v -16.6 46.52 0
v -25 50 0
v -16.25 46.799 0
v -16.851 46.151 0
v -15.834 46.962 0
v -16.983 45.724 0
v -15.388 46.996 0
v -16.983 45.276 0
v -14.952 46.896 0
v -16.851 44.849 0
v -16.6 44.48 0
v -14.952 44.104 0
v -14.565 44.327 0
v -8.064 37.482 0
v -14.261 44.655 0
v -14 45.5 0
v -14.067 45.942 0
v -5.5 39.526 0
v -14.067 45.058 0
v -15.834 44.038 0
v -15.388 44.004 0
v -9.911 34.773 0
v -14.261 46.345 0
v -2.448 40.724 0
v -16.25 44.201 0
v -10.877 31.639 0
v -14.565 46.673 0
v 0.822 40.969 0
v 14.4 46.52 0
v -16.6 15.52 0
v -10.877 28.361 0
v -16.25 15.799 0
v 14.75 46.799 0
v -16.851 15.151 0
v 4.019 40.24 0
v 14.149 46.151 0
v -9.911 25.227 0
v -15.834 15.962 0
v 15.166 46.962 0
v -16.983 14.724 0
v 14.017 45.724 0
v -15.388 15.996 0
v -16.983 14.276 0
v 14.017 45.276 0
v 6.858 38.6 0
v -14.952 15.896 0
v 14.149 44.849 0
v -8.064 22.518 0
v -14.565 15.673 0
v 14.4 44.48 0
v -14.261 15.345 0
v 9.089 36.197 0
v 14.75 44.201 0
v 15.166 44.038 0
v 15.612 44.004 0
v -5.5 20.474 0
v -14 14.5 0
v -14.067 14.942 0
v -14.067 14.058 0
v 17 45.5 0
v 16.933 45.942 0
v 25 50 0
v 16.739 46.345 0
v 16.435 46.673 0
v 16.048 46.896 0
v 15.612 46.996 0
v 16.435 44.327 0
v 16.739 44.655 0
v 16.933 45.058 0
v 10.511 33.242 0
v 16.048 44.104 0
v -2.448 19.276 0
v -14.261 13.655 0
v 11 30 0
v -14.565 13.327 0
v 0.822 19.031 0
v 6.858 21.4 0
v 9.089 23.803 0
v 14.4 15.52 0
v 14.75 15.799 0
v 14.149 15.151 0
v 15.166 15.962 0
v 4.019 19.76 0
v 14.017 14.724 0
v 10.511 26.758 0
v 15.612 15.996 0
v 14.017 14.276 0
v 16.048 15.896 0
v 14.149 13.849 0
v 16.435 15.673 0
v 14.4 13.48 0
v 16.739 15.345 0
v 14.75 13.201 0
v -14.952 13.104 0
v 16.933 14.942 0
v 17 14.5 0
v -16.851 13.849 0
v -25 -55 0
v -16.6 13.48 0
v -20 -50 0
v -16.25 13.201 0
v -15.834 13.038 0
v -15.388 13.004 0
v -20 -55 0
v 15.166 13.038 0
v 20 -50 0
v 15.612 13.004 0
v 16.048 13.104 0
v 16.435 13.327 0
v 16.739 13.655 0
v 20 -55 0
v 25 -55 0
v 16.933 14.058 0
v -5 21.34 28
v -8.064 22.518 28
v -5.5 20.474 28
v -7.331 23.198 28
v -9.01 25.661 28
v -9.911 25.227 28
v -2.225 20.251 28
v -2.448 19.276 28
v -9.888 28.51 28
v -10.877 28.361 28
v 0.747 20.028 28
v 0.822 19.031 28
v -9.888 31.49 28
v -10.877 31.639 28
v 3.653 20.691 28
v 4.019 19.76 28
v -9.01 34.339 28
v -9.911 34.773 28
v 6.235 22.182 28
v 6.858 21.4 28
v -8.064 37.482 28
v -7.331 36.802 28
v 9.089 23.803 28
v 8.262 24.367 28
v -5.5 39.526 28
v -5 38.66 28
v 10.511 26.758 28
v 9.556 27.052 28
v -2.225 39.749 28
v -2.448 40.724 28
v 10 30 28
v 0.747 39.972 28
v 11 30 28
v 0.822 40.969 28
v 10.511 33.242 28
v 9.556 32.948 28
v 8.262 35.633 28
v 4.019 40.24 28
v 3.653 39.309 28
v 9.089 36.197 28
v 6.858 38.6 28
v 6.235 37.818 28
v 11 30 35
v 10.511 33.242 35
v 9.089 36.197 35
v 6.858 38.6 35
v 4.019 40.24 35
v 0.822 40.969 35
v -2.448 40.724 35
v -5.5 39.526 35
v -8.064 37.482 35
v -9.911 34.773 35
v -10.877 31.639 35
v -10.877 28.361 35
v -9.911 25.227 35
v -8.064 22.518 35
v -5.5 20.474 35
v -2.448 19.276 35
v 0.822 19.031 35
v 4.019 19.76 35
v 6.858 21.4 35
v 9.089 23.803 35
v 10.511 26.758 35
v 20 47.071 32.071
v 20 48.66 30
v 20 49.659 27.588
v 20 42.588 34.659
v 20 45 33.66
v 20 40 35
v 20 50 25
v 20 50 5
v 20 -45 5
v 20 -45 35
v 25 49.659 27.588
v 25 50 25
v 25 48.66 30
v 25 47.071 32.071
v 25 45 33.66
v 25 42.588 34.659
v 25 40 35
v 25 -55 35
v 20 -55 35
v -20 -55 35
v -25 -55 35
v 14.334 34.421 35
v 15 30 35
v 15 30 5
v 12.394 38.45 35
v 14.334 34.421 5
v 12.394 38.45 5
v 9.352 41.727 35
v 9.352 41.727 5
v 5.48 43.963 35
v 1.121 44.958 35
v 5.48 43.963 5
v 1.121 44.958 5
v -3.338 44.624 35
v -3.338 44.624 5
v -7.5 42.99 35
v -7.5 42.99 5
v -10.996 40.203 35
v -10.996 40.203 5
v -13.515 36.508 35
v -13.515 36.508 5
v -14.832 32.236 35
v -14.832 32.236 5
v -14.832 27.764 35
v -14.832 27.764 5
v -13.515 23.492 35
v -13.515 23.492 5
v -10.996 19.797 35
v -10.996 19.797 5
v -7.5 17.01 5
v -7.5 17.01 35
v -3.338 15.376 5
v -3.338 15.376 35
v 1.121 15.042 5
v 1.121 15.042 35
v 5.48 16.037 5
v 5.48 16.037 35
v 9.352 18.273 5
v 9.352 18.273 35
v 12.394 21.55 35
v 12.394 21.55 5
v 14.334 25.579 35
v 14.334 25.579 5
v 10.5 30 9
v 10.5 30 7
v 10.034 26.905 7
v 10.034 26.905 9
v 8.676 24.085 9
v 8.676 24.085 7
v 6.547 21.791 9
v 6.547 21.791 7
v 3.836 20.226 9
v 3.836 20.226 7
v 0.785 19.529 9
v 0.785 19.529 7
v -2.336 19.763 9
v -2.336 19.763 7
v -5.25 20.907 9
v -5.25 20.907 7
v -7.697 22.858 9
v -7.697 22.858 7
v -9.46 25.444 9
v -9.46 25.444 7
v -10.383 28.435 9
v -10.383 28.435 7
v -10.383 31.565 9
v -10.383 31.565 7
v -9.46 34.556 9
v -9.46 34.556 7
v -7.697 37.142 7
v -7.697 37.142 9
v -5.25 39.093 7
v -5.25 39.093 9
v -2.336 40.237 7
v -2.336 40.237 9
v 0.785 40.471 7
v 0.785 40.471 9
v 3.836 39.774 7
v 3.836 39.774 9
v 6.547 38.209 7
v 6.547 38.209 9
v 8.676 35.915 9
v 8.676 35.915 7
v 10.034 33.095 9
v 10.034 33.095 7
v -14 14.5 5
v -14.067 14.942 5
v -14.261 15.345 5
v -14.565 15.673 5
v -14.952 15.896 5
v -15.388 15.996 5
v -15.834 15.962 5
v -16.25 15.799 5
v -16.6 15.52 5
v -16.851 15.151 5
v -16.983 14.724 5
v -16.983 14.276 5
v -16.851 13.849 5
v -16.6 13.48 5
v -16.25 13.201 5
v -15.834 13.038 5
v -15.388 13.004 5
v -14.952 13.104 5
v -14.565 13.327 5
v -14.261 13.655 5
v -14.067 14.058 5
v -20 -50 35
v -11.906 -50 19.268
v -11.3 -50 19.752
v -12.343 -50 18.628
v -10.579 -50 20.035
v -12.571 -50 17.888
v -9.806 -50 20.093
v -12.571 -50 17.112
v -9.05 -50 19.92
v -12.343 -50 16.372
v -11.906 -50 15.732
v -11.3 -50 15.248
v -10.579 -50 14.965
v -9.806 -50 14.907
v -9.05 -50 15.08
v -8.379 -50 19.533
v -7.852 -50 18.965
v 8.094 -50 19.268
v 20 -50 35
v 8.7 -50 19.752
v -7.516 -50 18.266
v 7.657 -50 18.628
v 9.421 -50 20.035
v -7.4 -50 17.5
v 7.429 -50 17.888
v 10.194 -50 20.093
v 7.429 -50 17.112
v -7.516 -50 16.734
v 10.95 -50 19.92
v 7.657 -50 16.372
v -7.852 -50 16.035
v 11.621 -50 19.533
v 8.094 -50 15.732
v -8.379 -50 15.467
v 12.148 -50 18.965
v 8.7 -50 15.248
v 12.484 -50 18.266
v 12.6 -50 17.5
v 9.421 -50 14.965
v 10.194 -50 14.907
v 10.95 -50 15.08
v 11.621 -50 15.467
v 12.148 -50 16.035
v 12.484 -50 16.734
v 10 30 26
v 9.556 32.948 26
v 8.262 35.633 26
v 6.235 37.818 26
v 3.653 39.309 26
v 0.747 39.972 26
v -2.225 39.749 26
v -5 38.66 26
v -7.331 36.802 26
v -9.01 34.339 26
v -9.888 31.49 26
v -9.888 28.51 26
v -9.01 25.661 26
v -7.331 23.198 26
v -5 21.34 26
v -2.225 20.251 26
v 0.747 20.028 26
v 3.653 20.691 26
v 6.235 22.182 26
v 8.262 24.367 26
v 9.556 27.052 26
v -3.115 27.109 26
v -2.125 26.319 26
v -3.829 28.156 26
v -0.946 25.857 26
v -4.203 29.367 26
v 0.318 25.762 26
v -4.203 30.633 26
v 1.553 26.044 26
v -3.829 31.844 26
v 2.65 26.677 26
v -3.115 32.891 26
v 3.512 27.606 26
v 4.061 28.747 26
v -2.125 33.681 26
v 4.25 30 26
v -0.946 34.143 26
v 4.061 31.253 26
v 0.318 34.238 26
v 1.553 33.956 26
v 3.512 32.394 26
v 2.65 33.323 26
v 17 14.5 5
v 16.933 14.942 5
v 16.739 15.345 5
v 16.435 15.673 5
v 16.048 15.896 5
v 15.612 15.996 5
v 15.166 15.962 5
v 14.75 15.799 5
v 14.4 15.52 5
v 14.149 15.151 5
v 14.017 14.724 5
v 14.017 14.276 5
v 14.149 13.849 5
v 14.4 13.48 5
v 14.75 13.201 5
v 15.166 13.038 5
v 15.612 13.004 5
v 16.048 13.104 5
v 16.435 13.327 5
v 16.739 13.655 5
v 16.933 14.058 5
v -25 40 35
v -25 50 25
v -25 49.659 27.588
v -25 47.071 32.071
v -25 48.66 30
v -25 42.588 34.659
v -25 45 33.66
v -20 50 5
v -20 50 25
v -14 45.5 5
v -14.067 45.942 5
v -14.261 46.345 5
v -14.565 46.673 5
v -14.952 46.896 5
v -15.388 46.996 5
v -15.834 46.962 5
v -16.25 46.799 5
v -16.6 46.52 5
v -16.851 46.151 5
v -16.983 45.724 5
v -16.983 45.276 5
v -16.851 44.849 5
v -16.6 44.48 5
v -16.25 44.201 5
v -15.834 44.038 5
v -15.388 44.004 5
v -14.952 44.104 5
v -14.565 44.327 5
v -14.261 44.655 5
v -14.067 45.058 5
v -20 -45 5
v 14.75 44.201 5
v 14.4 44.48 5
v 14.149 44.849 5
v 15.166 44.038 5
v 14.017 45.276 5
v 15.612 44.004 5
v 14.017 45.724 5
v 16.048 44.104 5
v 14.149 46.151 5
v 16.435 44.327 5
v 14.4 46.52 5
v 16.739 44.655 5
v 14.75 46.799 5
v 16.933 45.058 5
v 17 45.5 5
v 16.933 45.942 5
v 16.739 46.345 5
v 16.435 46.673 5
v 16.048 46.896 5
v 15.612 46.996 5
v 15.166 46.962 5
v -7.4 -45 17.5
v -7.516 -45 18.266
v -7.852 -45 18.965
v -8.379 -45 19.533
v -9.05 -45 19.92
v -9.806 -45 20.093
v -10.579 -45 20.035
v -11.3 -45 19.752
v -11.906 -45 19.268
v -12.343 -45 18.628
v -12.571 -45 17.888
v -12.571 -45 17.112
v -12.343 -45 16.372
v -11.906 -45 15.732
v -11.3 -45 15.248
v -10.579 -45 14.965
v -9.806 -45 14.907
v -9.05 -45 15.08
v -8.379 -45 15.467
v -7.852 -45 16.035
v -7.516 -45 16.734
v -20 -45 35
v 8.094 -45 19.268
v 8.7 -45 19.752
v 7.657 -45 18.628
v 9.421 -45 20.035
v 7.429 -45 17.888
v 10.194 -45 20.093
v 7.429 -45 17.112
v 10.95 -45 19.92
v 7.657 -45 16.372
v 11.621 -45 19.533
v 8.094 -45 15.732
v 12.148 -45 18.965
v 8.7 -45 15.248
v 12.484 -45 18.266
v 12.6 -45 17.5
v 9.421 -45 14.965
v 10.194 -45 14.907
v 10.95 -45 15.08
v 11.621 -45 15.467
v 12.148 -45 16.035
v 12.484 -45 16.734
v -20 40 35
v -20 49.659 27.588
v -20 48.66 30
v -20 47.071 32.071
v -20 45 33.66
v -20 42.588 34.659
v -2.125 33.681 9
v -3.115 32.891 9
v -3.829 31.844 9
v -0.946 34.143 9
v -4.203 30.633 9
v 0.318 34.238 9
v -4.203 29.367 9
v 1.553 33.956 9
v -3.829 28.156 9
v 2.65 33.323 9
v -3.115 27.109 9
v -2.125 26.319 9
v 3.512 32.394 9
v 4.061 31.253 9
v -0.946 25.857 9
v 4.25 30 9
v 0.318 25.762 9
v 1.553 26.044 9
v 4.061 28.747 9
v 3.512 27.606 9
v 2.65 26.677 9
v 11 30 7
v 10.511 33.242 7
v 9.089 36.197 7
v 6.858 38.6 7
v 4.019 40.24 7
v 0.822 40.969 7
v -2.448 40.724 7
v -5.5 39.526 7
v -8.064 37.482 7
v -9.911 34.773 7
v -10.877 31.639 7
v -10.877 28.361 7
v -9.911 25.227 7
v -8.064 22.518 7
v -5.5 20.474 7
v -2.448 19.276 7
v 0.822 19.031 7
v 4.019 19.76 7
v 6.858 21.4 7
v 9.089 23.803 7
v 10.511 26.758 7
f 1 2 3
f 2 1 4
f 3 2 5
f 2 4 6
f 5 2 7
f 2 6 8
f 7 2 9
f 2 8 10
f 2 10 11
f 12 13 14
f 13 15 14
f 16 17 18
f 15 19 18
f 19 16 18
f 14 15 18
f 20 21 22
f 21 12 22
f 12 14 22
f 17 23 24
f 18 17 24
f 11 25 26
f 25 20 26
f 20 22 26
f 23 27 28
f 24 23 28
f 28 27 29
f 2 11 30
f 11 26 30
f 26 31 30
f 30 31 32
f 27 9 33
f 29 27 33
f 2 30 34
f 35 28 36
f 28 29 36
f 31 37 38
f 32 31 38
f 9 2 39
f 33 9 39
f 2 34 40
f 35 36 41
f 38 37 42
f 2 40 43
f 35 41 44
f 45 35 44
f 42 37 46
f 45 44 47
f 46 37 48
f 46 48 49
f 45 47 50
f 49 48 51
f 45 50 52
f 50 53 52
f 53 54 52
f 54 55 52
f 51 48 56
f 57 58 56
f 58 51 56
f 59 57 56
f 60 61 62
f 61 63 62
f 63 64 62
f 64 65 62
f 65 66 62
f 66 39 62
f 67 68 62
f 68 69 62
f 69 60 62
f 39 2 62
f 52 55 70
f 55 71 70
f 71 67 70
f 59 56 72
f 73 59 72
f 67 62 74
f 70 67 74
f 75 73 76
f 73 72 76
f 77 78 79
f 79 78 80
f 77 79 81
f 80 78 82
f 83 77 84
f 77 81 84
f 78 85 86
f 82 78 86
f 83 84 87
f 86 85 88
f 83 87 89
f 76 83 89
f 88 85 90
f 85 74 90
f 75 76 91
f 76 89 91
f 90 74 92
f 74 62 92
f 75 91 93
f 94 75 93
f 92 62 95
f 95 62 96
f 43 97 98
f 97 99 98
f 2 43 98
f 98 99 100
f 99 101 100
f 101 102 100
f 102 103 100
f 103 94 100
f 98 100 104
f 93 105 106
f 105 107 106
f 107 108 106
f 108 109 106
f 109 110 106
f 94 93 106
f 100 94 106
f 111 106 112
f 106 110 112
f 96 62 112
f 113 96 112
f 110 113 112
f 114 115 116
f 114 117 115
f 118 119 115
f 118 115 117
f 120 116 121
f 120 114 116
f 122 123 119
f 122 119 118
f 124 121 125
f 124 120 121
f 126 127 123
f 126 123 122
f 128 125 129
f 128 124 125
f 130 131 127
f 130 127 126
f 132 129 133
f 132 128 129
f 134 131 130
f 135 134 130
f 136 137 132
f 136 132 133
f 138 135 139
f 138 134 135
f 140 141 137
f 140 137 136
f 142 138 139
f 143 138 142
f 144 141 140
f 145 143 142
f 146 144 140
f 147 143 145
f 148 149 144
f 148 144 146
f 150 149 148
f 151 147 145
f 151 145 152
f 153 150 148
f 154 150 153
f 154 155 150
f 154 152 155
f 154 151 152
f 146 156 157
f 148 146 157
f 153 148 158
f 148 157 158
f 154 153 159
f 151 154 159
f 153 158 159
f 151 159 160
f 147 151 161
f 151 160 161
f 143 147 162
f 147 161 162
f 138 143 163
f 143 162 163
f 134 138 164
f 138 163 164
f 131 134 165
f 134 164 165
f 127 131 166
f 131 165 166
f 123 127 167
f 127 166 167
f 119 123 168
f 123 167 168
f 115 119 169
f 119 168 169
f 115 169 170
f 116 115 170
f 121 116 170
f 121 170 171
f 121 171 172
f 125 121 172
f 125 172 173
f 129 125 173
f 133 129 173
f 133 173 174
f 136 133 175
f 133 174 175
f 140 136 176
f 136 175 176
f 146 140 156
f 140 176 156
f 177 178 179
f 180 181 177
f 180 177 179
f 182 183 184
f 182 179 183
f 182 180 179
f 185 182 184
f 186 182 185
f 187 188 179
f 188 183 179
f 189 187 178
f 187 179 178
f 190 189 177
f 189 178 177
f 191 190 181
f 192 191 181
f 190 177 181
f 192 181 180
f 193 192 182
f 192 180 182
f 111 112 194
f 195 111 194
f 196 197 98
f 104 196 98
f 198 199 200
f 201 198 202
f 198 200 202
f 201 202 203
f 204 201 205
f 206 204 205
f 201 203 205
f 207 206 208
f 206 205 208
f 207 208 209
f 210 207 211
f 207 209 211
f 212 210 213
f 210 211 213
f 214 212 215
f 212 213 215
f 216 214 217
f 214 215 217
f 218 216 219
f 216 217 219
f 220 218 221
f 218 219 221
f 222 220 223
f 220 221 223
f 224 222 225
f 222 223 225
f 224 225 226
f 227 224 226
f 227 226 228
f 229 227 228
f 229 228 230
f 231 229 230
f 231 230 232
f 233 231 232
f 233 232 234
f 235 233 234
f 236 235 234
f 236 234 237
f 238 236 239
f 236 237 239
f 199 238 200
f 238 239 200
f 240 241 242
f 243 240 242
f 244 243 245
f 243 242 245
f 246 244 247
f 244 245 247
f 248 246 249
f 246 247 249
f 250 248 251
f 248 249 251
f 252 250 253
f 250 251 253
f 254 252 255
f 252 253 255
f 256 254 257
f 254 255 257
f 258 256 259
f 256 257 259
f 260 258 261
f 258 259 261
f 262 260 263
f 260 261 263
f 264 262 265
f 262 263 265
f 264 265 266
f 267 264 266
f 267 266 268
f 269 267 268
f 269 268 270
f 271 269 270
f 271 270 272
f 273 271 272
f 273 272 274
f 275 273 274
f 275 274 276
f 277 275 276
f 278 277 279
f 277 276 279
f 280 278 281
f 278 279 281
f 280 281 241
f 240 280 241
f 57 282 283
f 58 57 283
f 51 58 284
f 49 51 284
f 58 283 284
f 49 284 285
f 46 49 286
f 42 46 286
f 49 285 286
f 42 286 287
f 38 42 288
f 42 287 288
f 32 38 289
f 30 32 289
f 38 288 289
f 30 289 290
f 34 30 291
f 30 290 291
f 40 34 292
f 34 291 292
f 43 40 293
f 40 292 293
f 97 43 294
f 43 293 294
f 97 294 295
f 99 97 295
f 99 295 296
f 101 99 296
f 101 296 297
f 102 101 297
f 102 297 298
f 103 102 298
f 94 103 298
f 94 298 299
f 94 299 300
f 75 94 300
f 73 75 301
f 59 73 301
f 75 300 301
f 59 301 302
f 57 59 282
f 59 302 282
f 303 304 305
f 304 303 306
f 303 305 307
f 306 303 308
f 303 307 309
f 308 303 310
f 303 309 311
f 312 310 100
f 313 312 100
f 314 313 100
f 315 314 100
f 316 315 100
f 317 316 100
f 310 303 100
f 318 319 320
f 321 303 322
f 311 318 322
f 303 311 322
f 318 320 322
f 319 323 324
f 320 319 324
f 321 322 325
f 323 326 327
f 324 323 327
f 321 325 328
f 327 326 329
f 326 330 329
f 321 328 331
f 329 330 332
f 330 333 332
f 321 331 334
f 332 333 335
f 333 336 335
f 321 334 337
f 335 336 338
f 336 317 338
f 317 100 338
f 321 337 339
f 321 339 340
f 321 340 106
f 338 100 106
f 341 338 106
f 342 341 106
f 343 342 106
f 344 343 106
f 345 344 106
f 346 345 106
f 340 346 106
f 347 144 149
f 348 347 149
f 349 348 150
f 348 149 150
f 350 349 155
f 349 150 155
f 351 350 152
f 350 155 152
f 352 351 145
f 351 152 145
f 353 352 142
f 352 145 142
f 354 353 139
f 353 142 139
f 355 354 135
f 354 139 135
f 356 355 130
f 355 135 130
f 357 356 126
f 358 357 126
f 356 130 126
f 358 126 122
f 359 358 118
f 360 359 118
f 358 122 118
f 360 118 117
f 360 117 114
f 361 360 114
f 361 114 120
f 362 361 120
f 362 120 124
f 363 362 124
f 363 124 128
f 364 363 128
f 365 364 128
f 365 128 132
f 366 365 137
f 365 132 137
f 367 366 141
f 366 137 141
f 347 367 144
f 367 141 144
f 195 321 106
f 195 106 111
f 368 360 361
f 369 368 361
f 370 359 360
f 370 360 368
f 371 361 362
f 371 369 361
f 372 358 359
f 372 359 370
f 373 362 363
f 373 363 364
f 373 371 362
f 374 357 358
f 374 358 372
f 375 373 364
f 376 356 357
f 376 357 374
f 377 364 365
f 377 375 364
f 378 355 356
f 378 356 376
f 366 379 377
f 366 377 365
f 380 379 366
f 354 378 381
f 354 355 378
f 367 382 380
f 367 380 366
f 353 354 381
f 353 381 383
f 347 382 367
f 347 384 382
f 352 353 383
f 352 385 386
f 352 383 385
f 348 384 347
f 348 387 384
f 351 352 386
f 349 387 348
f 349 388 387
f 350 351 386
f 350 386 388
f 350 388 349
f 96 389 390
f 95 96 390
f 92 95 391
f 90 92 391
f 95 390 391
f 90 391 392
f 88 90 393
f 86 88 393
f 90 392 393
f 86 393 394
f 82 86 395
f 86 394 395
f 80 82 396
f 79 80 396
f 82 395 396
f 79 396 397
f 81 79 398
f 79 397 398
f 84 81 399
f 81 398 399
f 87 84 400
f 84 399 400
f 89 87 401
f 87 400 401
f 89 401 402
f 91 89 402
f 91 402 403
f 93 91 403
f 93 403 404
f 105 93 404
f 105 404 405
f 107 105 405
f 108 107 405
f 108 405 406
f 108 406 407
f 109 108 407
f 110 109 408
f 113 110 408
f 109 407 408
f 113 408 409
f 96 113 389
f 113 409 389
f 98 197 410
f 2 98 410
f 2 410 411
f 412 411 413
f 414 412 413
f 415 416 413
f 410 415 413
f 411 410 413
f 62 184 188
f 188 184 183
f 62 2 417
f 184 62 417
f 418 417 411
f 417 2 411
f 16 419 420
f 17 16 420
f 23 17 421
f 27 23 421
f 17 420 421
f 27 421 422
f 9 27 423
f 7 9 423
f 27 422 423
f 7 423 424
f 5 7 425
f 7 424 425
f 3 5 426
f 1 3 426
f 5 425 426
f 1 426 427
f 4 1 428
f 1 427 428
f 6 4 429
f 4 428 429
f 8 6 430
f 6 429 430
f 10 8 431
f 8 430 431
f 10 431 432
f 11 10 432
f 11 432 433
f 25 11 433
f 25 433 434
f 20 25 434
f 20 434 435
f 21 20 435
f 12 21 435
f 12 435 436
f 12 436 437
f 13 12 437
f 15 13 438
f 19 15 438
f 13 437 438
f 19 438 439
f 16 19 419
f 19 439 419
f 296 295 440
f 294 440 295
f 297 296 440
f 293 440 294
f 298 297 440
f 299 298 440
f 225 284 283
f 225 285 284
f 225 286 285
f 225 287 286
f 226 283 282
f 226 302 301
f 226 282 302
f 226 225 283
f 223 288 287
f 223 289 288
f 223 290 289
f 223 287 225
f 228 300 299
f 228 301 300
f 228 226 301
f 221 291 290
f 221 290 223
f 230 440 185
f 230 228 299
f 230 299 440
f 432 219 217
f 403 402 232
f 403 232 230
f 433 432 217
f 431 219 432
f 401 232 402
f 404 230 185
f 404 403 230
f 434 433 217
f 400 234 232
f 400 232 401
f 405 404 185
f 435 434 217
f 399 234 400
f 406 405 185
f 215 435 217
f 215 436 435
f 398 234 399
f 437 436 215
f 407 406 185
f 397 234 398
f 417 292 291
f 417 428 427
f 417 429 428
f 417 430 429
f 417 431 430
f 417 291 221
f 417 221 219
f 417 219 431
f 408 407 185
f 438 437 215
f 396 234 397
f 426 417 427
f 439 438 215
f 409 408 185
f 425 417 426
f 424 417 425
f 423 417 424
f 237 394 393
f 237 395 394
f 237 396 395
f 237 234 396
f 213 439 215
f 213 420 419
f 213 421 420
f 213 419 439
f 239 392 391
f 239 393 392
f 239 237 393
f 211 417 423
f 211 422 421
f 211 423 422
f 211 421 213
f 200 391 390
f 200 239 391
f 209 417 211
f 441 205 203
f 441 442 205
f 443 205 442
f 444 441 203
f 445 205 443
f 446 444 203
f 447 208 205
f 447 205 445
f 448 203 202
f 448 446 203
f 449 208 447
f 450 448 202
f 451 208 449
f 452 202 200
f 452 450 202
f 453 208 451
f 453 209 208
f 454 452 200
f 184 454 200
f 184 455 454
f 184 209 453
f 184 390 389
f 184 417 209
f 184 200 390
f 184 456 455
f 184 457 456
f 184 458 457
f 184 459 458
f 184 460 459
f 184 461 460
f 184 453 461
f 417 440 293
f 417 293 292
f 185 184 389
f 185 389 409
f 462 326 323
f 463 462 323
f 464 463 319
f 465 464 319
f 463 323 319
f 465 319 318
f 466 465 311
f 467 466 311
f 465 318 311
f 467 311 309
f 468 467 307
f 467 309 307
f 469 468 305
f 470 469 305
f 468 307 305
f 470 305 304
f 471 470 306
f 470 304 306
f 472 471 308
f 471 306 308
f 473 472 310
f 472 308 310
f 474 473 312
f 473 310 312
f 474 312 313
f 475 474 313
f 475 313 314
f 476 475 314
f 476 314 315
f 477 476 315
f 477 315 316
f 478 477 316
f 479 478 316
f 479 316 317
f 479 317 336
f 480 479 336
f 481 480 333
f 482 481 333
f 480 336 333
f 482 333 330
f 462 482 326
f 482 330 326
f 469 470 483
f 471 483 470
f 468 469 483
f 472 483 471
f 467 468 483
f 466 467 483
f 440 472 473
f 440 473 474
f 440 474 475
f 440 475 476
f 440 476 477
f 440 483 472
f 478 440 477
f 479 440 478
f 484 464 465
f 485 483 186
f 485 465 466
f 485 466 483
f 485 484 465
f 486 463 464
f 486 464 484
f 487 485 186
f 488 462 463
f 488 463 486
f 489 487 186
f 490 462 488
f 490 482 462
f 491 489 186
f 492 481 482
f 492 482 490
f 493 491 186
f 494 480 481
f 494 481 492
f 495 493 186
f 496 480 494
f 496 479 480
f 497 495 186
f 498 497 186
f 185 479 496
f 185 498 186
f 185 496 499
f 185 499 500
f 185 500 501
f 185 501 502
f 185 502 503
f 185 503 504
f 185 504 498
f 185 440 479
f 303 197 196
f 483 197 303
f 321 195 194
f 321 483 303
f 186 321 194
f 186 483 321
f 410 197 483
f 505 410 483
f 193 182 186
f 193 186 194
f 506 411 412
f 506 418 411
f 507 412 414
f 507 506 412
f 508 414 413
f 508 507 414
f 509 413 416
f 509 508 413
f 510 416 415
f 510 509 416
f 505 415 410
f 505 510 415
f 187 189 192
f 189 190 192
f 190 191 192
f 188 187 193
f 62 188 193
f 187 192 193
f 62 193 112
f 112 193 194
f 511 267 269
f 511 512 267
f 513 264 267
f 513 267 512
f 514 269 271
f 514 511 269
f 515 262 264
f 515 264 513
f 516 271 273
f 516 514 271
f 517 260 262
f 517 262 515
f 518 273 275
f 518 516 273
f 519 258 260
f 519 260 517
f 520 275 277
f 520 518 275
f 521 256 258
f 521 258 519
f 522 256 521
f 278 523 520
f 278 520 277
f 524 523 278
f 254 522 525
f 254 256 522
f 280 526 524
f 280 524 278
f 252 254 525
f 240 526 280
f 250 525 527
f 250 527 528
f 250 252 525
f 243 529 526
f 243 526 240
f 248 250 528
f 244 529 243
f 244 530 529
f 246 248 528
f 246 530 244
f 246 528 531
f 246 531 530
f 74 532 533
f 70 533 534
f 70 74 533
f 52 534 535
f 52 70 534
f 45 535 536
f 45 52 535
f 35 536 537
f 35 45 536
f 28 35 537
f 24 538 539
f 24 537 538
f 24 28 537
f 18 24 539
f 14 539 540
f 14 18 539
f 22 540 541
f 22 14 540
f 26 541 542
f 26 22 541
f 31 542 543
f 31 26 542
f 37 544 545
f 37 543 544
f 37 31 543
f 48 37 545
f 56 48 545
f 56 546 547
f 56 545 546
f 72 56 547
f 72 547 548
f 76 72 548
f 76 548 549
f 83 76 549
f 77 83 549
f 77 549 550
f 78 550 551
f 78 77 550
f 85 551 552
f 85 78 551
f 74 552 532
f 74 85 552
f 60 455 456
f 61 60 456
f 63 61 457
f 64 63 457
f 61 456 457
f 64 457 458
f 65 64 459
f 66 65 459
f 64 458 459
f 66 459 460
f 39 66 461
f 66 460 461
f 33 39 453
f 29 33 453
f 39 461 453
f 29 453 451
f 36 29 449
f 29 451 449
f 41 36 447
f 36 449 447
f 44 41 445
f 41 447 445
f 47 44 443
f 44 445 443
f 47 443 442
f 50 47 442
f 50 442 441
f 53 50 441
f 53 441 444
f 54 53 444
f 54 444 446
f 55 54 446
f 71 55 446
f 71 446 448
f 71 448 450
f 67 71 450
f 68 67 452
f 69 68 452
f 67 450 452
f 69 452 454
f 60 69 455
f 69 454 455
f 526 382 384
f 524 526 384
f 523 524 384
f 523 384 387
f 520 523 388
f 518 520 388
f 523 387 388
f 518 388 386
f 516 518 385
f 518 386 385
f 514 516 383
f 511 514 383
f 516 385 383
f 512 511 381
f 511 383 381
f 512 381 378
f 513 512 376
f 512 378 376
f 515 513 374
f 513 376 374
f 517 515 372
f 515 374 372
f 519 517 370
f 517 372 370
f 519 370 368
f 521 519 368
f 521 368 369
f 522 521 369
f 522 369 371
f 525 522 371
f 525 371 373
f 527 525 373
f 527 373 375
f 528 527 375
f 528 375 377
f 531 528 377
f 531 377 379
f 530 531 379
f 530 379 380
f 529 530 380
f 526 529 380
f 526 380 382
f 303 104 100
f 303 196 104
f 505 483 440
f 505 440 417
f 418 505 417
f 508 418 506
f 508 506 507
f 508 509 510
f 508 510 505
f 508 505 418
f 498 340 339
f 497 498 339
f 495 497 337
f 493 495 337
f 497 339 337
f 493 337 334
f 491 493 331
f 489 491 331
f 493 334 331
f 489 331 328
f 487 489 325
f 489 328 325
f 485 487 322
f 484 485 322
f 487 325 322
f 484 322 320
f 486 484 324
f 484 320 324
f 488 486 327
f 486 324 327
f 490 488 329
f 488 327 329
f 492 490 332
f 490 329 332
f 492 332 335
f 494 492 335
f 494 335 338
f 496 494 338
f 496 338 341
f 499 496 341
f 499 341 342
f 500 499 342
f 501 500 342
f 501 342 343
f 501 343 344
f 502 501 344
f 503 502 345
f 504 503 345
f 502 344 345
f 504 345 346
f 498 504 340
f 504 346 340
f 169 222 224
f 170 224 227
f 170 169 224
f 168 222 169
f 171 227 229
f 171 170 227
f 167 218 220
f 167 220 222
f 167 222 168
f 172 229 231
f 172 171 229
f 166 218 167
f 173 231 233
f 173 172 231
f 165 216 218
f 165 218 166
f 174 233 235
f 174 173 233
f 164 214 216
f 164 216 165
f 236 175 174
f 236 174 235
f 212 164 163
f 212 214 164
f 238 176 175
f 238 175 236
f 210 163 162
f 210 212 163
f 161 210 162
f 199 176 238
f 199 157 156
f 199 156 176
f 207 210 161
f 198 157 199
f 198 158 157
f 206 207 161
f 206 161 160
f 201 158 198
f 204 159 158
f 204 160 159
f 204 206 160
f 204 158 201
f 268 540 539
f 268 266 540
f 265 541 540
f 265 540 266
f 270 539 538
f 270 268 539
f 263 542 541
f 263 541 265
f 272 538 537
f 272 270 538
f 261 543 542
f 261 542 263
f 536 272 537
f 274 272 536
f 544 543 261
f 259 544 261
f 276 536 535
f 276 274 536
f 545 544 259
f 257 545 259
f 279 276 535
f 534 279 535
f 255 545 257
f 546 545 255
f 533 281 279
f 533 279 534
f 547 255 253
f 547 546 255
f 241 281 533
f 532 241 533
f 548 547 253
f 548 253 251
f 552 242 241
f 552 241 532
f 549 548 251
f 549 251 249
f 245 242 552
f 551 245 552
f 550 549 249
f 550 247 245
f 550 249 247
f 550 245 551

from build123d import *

# Parameters (mm, degrees)
SKETCH_W        = 50
SKETCH_H        = 100
SKETCH_R        = 11
PAD_DEPTH       = 5
PAD001_DEPTH    = 5
PAD002_DEPTH    = 5
SKETCH003_W     = 40
SKETCH003_H     = 5
PAD003_DEPTH    = 30
SKETCH004_R     = 1.5
POCKET_DEPTH    = 5
SKETCH005_R     = 15
PAD004_DEPTH    = 30
SKETCH006_R     = 11
POCKET001_DEPTH = 7
SKETCH007_R     = 10
POCKET002_DEPTH = 2
SKETCH008_R     = 4.25
POCKET003_DEPTH = 26.001
SKETCH009_R     = 11
POCKET004_DEPTH = 2
SKETCH010_R     = 10.5
POCKET005_DEPTH = 2
SKETCH011_R     = 2.6
POCKET006_DEPTH = 5
FILLET_R        = 10


with BuildPart() as part:
    # Sketch → Pad (new body)
    with BuildSketch(Plane.XY):
        Rectangle(SKETCH_W, SKETCH_H)
        with Locations((0, 30)):
            Circle(SKETCH_R, mode=Mode.SUBTRACT)
    extrude(amount=PAD_DEPTH)

    # Sketch001 (on Face1 of Pad) → Pad001 (join)
    with BuildSketch(Plane(origin=(-25, 0, 0), x_dir=(0, -1, 0), z_dir=(-1, 0, 0))):
        Polygon((-50, 5), (-50, 35), (55, 35), (55, 0), (50, 0), (50, 5), align=None)
    extrude(amount=-PAD001_DEPTH)

    # Sketch002 (on Face4 of Pad001) → Pad002 (join)
    with BuildSketch(Plane.YZ.offset(25)):
        Polygon((-50, 0), (-55, 0), (-55, 35), (50, 35), (50, 5), (-50, 5), align=None)
    extrude(amount=-PAD002_DEPTH)

    # Sketch003 (on Face7 of Pad002) → Pad003 (join)
    with BuildSketch(Plane.XY.offset(5)):
        with Locations((0, -47.5)):
            Rectangle(SKETCH003_W, SKETCH003_H)
    extrude(amount=PAD003_DEPTH)

    # Sketch004 (on Face9 of Pad003) → Pocket (cut)
    with BuildSketch(Plane.XY.offset(5)):
        with Locations((-15.5, 45.5)):
            Circle(SKETCH004_R)
        with Locations((-15.5, 14.5)):
            Circle(SKETCH004_R)
        with Locations((15.5, 14.5)):
            Circle(SKETCH004_R)
        with Locations((15.5, 45.5)):
            Circle(SKETCH004_R)
    extrude(amount=-POCKET_DEPTH, mode=Mode.SUBTRACT)

    # Sketch005 (on Face6 of Pocket) → Pad004 (join)
    with BuildSketch(Plane.XY.offset(5)):
        with Locations((0, 30)):
            Circle(SKETCH005_R)
    extrude(amount=PAD004_DEPTH)

    # Sketch006 (on Face22 of Pad004) → Pocket001 (cut)
    with BuildSketch(Plane.XY.offset(35)):
        with Locations((0, 30)):
            Circle(SKETCH006_R)
    extrude(amount=-POCKET001_DEPTH, mode=Mode.SUBTRACT)

    # Sketch007 (on Face24 of Pocket001) → Pocket002 (cut)
    with BuildSketch(Plane.XY.offset(28)):
        with Locations((0, 30)):
            Circle(SKETCH007_R)
    extrude(amount=-POCKET002_DEPTH, mode=Mode.SUBTRACT)

    # Sketch008 (on Face26 of Pocket002) → Pocket003 (cut, through all)
    with BuildSketch(Plane.XY.offset(26)):
        with Locations((0, 30)):
            Circle(SKETCH008_R)
    extrude(amount=-POCKET003_DEPTH, mode=Mode.SUBTRACT)

    # Sketch009 (on Face21 of Pocket003) → Pocket004 (cut)
    with BuildSketch(Plane(origin=(0, 0, 5), x_dir=(1, 0, 0), z_dir=(0, 0, -1))):
        with Locations((0, -30)):
            Circle(SKETCH009_R)
    extrude(amount=-POCKET004_DEPTH, mode=Mode.SUBTRACT)

    # Sketch010 (on Face24 of Pocket004) → Pocket005 (cut)
    with BuildSketch(Plane(origin=(0, 0, 7), x_dir=(1, 0, 0), z_dir=(0, 0, -1))):
        with Locations((0, -30)):
            Circle(SKETCH010_R)
    extrude(amount=-POCKET005_DEPTH, mode=Mode.SUBTRACT)

    # Sketch011 (on Face12 of Pocket005) → Pocket006 (cut)
    with BuildSketch(Plane.XZ.offset(50)):
        with Locations((-10, 17.5)):
            Circle(SKETCH011_R)
        with Locations((10, 17.5)):
            Circle(SKETCH011_R)
    extrude(amount=-POCKET006_DEPTH, mode=Mode.SUBTRACT)

    # Fillet
    fillet_edges = [part.edges().sort_by_distance(p)[0] for p in [
        (22.5, 50, 35),
        (-22.5, 50, 35),
    ]]
    fillet(fillet_edges, radius=FILLET_R)


solid = part.part
